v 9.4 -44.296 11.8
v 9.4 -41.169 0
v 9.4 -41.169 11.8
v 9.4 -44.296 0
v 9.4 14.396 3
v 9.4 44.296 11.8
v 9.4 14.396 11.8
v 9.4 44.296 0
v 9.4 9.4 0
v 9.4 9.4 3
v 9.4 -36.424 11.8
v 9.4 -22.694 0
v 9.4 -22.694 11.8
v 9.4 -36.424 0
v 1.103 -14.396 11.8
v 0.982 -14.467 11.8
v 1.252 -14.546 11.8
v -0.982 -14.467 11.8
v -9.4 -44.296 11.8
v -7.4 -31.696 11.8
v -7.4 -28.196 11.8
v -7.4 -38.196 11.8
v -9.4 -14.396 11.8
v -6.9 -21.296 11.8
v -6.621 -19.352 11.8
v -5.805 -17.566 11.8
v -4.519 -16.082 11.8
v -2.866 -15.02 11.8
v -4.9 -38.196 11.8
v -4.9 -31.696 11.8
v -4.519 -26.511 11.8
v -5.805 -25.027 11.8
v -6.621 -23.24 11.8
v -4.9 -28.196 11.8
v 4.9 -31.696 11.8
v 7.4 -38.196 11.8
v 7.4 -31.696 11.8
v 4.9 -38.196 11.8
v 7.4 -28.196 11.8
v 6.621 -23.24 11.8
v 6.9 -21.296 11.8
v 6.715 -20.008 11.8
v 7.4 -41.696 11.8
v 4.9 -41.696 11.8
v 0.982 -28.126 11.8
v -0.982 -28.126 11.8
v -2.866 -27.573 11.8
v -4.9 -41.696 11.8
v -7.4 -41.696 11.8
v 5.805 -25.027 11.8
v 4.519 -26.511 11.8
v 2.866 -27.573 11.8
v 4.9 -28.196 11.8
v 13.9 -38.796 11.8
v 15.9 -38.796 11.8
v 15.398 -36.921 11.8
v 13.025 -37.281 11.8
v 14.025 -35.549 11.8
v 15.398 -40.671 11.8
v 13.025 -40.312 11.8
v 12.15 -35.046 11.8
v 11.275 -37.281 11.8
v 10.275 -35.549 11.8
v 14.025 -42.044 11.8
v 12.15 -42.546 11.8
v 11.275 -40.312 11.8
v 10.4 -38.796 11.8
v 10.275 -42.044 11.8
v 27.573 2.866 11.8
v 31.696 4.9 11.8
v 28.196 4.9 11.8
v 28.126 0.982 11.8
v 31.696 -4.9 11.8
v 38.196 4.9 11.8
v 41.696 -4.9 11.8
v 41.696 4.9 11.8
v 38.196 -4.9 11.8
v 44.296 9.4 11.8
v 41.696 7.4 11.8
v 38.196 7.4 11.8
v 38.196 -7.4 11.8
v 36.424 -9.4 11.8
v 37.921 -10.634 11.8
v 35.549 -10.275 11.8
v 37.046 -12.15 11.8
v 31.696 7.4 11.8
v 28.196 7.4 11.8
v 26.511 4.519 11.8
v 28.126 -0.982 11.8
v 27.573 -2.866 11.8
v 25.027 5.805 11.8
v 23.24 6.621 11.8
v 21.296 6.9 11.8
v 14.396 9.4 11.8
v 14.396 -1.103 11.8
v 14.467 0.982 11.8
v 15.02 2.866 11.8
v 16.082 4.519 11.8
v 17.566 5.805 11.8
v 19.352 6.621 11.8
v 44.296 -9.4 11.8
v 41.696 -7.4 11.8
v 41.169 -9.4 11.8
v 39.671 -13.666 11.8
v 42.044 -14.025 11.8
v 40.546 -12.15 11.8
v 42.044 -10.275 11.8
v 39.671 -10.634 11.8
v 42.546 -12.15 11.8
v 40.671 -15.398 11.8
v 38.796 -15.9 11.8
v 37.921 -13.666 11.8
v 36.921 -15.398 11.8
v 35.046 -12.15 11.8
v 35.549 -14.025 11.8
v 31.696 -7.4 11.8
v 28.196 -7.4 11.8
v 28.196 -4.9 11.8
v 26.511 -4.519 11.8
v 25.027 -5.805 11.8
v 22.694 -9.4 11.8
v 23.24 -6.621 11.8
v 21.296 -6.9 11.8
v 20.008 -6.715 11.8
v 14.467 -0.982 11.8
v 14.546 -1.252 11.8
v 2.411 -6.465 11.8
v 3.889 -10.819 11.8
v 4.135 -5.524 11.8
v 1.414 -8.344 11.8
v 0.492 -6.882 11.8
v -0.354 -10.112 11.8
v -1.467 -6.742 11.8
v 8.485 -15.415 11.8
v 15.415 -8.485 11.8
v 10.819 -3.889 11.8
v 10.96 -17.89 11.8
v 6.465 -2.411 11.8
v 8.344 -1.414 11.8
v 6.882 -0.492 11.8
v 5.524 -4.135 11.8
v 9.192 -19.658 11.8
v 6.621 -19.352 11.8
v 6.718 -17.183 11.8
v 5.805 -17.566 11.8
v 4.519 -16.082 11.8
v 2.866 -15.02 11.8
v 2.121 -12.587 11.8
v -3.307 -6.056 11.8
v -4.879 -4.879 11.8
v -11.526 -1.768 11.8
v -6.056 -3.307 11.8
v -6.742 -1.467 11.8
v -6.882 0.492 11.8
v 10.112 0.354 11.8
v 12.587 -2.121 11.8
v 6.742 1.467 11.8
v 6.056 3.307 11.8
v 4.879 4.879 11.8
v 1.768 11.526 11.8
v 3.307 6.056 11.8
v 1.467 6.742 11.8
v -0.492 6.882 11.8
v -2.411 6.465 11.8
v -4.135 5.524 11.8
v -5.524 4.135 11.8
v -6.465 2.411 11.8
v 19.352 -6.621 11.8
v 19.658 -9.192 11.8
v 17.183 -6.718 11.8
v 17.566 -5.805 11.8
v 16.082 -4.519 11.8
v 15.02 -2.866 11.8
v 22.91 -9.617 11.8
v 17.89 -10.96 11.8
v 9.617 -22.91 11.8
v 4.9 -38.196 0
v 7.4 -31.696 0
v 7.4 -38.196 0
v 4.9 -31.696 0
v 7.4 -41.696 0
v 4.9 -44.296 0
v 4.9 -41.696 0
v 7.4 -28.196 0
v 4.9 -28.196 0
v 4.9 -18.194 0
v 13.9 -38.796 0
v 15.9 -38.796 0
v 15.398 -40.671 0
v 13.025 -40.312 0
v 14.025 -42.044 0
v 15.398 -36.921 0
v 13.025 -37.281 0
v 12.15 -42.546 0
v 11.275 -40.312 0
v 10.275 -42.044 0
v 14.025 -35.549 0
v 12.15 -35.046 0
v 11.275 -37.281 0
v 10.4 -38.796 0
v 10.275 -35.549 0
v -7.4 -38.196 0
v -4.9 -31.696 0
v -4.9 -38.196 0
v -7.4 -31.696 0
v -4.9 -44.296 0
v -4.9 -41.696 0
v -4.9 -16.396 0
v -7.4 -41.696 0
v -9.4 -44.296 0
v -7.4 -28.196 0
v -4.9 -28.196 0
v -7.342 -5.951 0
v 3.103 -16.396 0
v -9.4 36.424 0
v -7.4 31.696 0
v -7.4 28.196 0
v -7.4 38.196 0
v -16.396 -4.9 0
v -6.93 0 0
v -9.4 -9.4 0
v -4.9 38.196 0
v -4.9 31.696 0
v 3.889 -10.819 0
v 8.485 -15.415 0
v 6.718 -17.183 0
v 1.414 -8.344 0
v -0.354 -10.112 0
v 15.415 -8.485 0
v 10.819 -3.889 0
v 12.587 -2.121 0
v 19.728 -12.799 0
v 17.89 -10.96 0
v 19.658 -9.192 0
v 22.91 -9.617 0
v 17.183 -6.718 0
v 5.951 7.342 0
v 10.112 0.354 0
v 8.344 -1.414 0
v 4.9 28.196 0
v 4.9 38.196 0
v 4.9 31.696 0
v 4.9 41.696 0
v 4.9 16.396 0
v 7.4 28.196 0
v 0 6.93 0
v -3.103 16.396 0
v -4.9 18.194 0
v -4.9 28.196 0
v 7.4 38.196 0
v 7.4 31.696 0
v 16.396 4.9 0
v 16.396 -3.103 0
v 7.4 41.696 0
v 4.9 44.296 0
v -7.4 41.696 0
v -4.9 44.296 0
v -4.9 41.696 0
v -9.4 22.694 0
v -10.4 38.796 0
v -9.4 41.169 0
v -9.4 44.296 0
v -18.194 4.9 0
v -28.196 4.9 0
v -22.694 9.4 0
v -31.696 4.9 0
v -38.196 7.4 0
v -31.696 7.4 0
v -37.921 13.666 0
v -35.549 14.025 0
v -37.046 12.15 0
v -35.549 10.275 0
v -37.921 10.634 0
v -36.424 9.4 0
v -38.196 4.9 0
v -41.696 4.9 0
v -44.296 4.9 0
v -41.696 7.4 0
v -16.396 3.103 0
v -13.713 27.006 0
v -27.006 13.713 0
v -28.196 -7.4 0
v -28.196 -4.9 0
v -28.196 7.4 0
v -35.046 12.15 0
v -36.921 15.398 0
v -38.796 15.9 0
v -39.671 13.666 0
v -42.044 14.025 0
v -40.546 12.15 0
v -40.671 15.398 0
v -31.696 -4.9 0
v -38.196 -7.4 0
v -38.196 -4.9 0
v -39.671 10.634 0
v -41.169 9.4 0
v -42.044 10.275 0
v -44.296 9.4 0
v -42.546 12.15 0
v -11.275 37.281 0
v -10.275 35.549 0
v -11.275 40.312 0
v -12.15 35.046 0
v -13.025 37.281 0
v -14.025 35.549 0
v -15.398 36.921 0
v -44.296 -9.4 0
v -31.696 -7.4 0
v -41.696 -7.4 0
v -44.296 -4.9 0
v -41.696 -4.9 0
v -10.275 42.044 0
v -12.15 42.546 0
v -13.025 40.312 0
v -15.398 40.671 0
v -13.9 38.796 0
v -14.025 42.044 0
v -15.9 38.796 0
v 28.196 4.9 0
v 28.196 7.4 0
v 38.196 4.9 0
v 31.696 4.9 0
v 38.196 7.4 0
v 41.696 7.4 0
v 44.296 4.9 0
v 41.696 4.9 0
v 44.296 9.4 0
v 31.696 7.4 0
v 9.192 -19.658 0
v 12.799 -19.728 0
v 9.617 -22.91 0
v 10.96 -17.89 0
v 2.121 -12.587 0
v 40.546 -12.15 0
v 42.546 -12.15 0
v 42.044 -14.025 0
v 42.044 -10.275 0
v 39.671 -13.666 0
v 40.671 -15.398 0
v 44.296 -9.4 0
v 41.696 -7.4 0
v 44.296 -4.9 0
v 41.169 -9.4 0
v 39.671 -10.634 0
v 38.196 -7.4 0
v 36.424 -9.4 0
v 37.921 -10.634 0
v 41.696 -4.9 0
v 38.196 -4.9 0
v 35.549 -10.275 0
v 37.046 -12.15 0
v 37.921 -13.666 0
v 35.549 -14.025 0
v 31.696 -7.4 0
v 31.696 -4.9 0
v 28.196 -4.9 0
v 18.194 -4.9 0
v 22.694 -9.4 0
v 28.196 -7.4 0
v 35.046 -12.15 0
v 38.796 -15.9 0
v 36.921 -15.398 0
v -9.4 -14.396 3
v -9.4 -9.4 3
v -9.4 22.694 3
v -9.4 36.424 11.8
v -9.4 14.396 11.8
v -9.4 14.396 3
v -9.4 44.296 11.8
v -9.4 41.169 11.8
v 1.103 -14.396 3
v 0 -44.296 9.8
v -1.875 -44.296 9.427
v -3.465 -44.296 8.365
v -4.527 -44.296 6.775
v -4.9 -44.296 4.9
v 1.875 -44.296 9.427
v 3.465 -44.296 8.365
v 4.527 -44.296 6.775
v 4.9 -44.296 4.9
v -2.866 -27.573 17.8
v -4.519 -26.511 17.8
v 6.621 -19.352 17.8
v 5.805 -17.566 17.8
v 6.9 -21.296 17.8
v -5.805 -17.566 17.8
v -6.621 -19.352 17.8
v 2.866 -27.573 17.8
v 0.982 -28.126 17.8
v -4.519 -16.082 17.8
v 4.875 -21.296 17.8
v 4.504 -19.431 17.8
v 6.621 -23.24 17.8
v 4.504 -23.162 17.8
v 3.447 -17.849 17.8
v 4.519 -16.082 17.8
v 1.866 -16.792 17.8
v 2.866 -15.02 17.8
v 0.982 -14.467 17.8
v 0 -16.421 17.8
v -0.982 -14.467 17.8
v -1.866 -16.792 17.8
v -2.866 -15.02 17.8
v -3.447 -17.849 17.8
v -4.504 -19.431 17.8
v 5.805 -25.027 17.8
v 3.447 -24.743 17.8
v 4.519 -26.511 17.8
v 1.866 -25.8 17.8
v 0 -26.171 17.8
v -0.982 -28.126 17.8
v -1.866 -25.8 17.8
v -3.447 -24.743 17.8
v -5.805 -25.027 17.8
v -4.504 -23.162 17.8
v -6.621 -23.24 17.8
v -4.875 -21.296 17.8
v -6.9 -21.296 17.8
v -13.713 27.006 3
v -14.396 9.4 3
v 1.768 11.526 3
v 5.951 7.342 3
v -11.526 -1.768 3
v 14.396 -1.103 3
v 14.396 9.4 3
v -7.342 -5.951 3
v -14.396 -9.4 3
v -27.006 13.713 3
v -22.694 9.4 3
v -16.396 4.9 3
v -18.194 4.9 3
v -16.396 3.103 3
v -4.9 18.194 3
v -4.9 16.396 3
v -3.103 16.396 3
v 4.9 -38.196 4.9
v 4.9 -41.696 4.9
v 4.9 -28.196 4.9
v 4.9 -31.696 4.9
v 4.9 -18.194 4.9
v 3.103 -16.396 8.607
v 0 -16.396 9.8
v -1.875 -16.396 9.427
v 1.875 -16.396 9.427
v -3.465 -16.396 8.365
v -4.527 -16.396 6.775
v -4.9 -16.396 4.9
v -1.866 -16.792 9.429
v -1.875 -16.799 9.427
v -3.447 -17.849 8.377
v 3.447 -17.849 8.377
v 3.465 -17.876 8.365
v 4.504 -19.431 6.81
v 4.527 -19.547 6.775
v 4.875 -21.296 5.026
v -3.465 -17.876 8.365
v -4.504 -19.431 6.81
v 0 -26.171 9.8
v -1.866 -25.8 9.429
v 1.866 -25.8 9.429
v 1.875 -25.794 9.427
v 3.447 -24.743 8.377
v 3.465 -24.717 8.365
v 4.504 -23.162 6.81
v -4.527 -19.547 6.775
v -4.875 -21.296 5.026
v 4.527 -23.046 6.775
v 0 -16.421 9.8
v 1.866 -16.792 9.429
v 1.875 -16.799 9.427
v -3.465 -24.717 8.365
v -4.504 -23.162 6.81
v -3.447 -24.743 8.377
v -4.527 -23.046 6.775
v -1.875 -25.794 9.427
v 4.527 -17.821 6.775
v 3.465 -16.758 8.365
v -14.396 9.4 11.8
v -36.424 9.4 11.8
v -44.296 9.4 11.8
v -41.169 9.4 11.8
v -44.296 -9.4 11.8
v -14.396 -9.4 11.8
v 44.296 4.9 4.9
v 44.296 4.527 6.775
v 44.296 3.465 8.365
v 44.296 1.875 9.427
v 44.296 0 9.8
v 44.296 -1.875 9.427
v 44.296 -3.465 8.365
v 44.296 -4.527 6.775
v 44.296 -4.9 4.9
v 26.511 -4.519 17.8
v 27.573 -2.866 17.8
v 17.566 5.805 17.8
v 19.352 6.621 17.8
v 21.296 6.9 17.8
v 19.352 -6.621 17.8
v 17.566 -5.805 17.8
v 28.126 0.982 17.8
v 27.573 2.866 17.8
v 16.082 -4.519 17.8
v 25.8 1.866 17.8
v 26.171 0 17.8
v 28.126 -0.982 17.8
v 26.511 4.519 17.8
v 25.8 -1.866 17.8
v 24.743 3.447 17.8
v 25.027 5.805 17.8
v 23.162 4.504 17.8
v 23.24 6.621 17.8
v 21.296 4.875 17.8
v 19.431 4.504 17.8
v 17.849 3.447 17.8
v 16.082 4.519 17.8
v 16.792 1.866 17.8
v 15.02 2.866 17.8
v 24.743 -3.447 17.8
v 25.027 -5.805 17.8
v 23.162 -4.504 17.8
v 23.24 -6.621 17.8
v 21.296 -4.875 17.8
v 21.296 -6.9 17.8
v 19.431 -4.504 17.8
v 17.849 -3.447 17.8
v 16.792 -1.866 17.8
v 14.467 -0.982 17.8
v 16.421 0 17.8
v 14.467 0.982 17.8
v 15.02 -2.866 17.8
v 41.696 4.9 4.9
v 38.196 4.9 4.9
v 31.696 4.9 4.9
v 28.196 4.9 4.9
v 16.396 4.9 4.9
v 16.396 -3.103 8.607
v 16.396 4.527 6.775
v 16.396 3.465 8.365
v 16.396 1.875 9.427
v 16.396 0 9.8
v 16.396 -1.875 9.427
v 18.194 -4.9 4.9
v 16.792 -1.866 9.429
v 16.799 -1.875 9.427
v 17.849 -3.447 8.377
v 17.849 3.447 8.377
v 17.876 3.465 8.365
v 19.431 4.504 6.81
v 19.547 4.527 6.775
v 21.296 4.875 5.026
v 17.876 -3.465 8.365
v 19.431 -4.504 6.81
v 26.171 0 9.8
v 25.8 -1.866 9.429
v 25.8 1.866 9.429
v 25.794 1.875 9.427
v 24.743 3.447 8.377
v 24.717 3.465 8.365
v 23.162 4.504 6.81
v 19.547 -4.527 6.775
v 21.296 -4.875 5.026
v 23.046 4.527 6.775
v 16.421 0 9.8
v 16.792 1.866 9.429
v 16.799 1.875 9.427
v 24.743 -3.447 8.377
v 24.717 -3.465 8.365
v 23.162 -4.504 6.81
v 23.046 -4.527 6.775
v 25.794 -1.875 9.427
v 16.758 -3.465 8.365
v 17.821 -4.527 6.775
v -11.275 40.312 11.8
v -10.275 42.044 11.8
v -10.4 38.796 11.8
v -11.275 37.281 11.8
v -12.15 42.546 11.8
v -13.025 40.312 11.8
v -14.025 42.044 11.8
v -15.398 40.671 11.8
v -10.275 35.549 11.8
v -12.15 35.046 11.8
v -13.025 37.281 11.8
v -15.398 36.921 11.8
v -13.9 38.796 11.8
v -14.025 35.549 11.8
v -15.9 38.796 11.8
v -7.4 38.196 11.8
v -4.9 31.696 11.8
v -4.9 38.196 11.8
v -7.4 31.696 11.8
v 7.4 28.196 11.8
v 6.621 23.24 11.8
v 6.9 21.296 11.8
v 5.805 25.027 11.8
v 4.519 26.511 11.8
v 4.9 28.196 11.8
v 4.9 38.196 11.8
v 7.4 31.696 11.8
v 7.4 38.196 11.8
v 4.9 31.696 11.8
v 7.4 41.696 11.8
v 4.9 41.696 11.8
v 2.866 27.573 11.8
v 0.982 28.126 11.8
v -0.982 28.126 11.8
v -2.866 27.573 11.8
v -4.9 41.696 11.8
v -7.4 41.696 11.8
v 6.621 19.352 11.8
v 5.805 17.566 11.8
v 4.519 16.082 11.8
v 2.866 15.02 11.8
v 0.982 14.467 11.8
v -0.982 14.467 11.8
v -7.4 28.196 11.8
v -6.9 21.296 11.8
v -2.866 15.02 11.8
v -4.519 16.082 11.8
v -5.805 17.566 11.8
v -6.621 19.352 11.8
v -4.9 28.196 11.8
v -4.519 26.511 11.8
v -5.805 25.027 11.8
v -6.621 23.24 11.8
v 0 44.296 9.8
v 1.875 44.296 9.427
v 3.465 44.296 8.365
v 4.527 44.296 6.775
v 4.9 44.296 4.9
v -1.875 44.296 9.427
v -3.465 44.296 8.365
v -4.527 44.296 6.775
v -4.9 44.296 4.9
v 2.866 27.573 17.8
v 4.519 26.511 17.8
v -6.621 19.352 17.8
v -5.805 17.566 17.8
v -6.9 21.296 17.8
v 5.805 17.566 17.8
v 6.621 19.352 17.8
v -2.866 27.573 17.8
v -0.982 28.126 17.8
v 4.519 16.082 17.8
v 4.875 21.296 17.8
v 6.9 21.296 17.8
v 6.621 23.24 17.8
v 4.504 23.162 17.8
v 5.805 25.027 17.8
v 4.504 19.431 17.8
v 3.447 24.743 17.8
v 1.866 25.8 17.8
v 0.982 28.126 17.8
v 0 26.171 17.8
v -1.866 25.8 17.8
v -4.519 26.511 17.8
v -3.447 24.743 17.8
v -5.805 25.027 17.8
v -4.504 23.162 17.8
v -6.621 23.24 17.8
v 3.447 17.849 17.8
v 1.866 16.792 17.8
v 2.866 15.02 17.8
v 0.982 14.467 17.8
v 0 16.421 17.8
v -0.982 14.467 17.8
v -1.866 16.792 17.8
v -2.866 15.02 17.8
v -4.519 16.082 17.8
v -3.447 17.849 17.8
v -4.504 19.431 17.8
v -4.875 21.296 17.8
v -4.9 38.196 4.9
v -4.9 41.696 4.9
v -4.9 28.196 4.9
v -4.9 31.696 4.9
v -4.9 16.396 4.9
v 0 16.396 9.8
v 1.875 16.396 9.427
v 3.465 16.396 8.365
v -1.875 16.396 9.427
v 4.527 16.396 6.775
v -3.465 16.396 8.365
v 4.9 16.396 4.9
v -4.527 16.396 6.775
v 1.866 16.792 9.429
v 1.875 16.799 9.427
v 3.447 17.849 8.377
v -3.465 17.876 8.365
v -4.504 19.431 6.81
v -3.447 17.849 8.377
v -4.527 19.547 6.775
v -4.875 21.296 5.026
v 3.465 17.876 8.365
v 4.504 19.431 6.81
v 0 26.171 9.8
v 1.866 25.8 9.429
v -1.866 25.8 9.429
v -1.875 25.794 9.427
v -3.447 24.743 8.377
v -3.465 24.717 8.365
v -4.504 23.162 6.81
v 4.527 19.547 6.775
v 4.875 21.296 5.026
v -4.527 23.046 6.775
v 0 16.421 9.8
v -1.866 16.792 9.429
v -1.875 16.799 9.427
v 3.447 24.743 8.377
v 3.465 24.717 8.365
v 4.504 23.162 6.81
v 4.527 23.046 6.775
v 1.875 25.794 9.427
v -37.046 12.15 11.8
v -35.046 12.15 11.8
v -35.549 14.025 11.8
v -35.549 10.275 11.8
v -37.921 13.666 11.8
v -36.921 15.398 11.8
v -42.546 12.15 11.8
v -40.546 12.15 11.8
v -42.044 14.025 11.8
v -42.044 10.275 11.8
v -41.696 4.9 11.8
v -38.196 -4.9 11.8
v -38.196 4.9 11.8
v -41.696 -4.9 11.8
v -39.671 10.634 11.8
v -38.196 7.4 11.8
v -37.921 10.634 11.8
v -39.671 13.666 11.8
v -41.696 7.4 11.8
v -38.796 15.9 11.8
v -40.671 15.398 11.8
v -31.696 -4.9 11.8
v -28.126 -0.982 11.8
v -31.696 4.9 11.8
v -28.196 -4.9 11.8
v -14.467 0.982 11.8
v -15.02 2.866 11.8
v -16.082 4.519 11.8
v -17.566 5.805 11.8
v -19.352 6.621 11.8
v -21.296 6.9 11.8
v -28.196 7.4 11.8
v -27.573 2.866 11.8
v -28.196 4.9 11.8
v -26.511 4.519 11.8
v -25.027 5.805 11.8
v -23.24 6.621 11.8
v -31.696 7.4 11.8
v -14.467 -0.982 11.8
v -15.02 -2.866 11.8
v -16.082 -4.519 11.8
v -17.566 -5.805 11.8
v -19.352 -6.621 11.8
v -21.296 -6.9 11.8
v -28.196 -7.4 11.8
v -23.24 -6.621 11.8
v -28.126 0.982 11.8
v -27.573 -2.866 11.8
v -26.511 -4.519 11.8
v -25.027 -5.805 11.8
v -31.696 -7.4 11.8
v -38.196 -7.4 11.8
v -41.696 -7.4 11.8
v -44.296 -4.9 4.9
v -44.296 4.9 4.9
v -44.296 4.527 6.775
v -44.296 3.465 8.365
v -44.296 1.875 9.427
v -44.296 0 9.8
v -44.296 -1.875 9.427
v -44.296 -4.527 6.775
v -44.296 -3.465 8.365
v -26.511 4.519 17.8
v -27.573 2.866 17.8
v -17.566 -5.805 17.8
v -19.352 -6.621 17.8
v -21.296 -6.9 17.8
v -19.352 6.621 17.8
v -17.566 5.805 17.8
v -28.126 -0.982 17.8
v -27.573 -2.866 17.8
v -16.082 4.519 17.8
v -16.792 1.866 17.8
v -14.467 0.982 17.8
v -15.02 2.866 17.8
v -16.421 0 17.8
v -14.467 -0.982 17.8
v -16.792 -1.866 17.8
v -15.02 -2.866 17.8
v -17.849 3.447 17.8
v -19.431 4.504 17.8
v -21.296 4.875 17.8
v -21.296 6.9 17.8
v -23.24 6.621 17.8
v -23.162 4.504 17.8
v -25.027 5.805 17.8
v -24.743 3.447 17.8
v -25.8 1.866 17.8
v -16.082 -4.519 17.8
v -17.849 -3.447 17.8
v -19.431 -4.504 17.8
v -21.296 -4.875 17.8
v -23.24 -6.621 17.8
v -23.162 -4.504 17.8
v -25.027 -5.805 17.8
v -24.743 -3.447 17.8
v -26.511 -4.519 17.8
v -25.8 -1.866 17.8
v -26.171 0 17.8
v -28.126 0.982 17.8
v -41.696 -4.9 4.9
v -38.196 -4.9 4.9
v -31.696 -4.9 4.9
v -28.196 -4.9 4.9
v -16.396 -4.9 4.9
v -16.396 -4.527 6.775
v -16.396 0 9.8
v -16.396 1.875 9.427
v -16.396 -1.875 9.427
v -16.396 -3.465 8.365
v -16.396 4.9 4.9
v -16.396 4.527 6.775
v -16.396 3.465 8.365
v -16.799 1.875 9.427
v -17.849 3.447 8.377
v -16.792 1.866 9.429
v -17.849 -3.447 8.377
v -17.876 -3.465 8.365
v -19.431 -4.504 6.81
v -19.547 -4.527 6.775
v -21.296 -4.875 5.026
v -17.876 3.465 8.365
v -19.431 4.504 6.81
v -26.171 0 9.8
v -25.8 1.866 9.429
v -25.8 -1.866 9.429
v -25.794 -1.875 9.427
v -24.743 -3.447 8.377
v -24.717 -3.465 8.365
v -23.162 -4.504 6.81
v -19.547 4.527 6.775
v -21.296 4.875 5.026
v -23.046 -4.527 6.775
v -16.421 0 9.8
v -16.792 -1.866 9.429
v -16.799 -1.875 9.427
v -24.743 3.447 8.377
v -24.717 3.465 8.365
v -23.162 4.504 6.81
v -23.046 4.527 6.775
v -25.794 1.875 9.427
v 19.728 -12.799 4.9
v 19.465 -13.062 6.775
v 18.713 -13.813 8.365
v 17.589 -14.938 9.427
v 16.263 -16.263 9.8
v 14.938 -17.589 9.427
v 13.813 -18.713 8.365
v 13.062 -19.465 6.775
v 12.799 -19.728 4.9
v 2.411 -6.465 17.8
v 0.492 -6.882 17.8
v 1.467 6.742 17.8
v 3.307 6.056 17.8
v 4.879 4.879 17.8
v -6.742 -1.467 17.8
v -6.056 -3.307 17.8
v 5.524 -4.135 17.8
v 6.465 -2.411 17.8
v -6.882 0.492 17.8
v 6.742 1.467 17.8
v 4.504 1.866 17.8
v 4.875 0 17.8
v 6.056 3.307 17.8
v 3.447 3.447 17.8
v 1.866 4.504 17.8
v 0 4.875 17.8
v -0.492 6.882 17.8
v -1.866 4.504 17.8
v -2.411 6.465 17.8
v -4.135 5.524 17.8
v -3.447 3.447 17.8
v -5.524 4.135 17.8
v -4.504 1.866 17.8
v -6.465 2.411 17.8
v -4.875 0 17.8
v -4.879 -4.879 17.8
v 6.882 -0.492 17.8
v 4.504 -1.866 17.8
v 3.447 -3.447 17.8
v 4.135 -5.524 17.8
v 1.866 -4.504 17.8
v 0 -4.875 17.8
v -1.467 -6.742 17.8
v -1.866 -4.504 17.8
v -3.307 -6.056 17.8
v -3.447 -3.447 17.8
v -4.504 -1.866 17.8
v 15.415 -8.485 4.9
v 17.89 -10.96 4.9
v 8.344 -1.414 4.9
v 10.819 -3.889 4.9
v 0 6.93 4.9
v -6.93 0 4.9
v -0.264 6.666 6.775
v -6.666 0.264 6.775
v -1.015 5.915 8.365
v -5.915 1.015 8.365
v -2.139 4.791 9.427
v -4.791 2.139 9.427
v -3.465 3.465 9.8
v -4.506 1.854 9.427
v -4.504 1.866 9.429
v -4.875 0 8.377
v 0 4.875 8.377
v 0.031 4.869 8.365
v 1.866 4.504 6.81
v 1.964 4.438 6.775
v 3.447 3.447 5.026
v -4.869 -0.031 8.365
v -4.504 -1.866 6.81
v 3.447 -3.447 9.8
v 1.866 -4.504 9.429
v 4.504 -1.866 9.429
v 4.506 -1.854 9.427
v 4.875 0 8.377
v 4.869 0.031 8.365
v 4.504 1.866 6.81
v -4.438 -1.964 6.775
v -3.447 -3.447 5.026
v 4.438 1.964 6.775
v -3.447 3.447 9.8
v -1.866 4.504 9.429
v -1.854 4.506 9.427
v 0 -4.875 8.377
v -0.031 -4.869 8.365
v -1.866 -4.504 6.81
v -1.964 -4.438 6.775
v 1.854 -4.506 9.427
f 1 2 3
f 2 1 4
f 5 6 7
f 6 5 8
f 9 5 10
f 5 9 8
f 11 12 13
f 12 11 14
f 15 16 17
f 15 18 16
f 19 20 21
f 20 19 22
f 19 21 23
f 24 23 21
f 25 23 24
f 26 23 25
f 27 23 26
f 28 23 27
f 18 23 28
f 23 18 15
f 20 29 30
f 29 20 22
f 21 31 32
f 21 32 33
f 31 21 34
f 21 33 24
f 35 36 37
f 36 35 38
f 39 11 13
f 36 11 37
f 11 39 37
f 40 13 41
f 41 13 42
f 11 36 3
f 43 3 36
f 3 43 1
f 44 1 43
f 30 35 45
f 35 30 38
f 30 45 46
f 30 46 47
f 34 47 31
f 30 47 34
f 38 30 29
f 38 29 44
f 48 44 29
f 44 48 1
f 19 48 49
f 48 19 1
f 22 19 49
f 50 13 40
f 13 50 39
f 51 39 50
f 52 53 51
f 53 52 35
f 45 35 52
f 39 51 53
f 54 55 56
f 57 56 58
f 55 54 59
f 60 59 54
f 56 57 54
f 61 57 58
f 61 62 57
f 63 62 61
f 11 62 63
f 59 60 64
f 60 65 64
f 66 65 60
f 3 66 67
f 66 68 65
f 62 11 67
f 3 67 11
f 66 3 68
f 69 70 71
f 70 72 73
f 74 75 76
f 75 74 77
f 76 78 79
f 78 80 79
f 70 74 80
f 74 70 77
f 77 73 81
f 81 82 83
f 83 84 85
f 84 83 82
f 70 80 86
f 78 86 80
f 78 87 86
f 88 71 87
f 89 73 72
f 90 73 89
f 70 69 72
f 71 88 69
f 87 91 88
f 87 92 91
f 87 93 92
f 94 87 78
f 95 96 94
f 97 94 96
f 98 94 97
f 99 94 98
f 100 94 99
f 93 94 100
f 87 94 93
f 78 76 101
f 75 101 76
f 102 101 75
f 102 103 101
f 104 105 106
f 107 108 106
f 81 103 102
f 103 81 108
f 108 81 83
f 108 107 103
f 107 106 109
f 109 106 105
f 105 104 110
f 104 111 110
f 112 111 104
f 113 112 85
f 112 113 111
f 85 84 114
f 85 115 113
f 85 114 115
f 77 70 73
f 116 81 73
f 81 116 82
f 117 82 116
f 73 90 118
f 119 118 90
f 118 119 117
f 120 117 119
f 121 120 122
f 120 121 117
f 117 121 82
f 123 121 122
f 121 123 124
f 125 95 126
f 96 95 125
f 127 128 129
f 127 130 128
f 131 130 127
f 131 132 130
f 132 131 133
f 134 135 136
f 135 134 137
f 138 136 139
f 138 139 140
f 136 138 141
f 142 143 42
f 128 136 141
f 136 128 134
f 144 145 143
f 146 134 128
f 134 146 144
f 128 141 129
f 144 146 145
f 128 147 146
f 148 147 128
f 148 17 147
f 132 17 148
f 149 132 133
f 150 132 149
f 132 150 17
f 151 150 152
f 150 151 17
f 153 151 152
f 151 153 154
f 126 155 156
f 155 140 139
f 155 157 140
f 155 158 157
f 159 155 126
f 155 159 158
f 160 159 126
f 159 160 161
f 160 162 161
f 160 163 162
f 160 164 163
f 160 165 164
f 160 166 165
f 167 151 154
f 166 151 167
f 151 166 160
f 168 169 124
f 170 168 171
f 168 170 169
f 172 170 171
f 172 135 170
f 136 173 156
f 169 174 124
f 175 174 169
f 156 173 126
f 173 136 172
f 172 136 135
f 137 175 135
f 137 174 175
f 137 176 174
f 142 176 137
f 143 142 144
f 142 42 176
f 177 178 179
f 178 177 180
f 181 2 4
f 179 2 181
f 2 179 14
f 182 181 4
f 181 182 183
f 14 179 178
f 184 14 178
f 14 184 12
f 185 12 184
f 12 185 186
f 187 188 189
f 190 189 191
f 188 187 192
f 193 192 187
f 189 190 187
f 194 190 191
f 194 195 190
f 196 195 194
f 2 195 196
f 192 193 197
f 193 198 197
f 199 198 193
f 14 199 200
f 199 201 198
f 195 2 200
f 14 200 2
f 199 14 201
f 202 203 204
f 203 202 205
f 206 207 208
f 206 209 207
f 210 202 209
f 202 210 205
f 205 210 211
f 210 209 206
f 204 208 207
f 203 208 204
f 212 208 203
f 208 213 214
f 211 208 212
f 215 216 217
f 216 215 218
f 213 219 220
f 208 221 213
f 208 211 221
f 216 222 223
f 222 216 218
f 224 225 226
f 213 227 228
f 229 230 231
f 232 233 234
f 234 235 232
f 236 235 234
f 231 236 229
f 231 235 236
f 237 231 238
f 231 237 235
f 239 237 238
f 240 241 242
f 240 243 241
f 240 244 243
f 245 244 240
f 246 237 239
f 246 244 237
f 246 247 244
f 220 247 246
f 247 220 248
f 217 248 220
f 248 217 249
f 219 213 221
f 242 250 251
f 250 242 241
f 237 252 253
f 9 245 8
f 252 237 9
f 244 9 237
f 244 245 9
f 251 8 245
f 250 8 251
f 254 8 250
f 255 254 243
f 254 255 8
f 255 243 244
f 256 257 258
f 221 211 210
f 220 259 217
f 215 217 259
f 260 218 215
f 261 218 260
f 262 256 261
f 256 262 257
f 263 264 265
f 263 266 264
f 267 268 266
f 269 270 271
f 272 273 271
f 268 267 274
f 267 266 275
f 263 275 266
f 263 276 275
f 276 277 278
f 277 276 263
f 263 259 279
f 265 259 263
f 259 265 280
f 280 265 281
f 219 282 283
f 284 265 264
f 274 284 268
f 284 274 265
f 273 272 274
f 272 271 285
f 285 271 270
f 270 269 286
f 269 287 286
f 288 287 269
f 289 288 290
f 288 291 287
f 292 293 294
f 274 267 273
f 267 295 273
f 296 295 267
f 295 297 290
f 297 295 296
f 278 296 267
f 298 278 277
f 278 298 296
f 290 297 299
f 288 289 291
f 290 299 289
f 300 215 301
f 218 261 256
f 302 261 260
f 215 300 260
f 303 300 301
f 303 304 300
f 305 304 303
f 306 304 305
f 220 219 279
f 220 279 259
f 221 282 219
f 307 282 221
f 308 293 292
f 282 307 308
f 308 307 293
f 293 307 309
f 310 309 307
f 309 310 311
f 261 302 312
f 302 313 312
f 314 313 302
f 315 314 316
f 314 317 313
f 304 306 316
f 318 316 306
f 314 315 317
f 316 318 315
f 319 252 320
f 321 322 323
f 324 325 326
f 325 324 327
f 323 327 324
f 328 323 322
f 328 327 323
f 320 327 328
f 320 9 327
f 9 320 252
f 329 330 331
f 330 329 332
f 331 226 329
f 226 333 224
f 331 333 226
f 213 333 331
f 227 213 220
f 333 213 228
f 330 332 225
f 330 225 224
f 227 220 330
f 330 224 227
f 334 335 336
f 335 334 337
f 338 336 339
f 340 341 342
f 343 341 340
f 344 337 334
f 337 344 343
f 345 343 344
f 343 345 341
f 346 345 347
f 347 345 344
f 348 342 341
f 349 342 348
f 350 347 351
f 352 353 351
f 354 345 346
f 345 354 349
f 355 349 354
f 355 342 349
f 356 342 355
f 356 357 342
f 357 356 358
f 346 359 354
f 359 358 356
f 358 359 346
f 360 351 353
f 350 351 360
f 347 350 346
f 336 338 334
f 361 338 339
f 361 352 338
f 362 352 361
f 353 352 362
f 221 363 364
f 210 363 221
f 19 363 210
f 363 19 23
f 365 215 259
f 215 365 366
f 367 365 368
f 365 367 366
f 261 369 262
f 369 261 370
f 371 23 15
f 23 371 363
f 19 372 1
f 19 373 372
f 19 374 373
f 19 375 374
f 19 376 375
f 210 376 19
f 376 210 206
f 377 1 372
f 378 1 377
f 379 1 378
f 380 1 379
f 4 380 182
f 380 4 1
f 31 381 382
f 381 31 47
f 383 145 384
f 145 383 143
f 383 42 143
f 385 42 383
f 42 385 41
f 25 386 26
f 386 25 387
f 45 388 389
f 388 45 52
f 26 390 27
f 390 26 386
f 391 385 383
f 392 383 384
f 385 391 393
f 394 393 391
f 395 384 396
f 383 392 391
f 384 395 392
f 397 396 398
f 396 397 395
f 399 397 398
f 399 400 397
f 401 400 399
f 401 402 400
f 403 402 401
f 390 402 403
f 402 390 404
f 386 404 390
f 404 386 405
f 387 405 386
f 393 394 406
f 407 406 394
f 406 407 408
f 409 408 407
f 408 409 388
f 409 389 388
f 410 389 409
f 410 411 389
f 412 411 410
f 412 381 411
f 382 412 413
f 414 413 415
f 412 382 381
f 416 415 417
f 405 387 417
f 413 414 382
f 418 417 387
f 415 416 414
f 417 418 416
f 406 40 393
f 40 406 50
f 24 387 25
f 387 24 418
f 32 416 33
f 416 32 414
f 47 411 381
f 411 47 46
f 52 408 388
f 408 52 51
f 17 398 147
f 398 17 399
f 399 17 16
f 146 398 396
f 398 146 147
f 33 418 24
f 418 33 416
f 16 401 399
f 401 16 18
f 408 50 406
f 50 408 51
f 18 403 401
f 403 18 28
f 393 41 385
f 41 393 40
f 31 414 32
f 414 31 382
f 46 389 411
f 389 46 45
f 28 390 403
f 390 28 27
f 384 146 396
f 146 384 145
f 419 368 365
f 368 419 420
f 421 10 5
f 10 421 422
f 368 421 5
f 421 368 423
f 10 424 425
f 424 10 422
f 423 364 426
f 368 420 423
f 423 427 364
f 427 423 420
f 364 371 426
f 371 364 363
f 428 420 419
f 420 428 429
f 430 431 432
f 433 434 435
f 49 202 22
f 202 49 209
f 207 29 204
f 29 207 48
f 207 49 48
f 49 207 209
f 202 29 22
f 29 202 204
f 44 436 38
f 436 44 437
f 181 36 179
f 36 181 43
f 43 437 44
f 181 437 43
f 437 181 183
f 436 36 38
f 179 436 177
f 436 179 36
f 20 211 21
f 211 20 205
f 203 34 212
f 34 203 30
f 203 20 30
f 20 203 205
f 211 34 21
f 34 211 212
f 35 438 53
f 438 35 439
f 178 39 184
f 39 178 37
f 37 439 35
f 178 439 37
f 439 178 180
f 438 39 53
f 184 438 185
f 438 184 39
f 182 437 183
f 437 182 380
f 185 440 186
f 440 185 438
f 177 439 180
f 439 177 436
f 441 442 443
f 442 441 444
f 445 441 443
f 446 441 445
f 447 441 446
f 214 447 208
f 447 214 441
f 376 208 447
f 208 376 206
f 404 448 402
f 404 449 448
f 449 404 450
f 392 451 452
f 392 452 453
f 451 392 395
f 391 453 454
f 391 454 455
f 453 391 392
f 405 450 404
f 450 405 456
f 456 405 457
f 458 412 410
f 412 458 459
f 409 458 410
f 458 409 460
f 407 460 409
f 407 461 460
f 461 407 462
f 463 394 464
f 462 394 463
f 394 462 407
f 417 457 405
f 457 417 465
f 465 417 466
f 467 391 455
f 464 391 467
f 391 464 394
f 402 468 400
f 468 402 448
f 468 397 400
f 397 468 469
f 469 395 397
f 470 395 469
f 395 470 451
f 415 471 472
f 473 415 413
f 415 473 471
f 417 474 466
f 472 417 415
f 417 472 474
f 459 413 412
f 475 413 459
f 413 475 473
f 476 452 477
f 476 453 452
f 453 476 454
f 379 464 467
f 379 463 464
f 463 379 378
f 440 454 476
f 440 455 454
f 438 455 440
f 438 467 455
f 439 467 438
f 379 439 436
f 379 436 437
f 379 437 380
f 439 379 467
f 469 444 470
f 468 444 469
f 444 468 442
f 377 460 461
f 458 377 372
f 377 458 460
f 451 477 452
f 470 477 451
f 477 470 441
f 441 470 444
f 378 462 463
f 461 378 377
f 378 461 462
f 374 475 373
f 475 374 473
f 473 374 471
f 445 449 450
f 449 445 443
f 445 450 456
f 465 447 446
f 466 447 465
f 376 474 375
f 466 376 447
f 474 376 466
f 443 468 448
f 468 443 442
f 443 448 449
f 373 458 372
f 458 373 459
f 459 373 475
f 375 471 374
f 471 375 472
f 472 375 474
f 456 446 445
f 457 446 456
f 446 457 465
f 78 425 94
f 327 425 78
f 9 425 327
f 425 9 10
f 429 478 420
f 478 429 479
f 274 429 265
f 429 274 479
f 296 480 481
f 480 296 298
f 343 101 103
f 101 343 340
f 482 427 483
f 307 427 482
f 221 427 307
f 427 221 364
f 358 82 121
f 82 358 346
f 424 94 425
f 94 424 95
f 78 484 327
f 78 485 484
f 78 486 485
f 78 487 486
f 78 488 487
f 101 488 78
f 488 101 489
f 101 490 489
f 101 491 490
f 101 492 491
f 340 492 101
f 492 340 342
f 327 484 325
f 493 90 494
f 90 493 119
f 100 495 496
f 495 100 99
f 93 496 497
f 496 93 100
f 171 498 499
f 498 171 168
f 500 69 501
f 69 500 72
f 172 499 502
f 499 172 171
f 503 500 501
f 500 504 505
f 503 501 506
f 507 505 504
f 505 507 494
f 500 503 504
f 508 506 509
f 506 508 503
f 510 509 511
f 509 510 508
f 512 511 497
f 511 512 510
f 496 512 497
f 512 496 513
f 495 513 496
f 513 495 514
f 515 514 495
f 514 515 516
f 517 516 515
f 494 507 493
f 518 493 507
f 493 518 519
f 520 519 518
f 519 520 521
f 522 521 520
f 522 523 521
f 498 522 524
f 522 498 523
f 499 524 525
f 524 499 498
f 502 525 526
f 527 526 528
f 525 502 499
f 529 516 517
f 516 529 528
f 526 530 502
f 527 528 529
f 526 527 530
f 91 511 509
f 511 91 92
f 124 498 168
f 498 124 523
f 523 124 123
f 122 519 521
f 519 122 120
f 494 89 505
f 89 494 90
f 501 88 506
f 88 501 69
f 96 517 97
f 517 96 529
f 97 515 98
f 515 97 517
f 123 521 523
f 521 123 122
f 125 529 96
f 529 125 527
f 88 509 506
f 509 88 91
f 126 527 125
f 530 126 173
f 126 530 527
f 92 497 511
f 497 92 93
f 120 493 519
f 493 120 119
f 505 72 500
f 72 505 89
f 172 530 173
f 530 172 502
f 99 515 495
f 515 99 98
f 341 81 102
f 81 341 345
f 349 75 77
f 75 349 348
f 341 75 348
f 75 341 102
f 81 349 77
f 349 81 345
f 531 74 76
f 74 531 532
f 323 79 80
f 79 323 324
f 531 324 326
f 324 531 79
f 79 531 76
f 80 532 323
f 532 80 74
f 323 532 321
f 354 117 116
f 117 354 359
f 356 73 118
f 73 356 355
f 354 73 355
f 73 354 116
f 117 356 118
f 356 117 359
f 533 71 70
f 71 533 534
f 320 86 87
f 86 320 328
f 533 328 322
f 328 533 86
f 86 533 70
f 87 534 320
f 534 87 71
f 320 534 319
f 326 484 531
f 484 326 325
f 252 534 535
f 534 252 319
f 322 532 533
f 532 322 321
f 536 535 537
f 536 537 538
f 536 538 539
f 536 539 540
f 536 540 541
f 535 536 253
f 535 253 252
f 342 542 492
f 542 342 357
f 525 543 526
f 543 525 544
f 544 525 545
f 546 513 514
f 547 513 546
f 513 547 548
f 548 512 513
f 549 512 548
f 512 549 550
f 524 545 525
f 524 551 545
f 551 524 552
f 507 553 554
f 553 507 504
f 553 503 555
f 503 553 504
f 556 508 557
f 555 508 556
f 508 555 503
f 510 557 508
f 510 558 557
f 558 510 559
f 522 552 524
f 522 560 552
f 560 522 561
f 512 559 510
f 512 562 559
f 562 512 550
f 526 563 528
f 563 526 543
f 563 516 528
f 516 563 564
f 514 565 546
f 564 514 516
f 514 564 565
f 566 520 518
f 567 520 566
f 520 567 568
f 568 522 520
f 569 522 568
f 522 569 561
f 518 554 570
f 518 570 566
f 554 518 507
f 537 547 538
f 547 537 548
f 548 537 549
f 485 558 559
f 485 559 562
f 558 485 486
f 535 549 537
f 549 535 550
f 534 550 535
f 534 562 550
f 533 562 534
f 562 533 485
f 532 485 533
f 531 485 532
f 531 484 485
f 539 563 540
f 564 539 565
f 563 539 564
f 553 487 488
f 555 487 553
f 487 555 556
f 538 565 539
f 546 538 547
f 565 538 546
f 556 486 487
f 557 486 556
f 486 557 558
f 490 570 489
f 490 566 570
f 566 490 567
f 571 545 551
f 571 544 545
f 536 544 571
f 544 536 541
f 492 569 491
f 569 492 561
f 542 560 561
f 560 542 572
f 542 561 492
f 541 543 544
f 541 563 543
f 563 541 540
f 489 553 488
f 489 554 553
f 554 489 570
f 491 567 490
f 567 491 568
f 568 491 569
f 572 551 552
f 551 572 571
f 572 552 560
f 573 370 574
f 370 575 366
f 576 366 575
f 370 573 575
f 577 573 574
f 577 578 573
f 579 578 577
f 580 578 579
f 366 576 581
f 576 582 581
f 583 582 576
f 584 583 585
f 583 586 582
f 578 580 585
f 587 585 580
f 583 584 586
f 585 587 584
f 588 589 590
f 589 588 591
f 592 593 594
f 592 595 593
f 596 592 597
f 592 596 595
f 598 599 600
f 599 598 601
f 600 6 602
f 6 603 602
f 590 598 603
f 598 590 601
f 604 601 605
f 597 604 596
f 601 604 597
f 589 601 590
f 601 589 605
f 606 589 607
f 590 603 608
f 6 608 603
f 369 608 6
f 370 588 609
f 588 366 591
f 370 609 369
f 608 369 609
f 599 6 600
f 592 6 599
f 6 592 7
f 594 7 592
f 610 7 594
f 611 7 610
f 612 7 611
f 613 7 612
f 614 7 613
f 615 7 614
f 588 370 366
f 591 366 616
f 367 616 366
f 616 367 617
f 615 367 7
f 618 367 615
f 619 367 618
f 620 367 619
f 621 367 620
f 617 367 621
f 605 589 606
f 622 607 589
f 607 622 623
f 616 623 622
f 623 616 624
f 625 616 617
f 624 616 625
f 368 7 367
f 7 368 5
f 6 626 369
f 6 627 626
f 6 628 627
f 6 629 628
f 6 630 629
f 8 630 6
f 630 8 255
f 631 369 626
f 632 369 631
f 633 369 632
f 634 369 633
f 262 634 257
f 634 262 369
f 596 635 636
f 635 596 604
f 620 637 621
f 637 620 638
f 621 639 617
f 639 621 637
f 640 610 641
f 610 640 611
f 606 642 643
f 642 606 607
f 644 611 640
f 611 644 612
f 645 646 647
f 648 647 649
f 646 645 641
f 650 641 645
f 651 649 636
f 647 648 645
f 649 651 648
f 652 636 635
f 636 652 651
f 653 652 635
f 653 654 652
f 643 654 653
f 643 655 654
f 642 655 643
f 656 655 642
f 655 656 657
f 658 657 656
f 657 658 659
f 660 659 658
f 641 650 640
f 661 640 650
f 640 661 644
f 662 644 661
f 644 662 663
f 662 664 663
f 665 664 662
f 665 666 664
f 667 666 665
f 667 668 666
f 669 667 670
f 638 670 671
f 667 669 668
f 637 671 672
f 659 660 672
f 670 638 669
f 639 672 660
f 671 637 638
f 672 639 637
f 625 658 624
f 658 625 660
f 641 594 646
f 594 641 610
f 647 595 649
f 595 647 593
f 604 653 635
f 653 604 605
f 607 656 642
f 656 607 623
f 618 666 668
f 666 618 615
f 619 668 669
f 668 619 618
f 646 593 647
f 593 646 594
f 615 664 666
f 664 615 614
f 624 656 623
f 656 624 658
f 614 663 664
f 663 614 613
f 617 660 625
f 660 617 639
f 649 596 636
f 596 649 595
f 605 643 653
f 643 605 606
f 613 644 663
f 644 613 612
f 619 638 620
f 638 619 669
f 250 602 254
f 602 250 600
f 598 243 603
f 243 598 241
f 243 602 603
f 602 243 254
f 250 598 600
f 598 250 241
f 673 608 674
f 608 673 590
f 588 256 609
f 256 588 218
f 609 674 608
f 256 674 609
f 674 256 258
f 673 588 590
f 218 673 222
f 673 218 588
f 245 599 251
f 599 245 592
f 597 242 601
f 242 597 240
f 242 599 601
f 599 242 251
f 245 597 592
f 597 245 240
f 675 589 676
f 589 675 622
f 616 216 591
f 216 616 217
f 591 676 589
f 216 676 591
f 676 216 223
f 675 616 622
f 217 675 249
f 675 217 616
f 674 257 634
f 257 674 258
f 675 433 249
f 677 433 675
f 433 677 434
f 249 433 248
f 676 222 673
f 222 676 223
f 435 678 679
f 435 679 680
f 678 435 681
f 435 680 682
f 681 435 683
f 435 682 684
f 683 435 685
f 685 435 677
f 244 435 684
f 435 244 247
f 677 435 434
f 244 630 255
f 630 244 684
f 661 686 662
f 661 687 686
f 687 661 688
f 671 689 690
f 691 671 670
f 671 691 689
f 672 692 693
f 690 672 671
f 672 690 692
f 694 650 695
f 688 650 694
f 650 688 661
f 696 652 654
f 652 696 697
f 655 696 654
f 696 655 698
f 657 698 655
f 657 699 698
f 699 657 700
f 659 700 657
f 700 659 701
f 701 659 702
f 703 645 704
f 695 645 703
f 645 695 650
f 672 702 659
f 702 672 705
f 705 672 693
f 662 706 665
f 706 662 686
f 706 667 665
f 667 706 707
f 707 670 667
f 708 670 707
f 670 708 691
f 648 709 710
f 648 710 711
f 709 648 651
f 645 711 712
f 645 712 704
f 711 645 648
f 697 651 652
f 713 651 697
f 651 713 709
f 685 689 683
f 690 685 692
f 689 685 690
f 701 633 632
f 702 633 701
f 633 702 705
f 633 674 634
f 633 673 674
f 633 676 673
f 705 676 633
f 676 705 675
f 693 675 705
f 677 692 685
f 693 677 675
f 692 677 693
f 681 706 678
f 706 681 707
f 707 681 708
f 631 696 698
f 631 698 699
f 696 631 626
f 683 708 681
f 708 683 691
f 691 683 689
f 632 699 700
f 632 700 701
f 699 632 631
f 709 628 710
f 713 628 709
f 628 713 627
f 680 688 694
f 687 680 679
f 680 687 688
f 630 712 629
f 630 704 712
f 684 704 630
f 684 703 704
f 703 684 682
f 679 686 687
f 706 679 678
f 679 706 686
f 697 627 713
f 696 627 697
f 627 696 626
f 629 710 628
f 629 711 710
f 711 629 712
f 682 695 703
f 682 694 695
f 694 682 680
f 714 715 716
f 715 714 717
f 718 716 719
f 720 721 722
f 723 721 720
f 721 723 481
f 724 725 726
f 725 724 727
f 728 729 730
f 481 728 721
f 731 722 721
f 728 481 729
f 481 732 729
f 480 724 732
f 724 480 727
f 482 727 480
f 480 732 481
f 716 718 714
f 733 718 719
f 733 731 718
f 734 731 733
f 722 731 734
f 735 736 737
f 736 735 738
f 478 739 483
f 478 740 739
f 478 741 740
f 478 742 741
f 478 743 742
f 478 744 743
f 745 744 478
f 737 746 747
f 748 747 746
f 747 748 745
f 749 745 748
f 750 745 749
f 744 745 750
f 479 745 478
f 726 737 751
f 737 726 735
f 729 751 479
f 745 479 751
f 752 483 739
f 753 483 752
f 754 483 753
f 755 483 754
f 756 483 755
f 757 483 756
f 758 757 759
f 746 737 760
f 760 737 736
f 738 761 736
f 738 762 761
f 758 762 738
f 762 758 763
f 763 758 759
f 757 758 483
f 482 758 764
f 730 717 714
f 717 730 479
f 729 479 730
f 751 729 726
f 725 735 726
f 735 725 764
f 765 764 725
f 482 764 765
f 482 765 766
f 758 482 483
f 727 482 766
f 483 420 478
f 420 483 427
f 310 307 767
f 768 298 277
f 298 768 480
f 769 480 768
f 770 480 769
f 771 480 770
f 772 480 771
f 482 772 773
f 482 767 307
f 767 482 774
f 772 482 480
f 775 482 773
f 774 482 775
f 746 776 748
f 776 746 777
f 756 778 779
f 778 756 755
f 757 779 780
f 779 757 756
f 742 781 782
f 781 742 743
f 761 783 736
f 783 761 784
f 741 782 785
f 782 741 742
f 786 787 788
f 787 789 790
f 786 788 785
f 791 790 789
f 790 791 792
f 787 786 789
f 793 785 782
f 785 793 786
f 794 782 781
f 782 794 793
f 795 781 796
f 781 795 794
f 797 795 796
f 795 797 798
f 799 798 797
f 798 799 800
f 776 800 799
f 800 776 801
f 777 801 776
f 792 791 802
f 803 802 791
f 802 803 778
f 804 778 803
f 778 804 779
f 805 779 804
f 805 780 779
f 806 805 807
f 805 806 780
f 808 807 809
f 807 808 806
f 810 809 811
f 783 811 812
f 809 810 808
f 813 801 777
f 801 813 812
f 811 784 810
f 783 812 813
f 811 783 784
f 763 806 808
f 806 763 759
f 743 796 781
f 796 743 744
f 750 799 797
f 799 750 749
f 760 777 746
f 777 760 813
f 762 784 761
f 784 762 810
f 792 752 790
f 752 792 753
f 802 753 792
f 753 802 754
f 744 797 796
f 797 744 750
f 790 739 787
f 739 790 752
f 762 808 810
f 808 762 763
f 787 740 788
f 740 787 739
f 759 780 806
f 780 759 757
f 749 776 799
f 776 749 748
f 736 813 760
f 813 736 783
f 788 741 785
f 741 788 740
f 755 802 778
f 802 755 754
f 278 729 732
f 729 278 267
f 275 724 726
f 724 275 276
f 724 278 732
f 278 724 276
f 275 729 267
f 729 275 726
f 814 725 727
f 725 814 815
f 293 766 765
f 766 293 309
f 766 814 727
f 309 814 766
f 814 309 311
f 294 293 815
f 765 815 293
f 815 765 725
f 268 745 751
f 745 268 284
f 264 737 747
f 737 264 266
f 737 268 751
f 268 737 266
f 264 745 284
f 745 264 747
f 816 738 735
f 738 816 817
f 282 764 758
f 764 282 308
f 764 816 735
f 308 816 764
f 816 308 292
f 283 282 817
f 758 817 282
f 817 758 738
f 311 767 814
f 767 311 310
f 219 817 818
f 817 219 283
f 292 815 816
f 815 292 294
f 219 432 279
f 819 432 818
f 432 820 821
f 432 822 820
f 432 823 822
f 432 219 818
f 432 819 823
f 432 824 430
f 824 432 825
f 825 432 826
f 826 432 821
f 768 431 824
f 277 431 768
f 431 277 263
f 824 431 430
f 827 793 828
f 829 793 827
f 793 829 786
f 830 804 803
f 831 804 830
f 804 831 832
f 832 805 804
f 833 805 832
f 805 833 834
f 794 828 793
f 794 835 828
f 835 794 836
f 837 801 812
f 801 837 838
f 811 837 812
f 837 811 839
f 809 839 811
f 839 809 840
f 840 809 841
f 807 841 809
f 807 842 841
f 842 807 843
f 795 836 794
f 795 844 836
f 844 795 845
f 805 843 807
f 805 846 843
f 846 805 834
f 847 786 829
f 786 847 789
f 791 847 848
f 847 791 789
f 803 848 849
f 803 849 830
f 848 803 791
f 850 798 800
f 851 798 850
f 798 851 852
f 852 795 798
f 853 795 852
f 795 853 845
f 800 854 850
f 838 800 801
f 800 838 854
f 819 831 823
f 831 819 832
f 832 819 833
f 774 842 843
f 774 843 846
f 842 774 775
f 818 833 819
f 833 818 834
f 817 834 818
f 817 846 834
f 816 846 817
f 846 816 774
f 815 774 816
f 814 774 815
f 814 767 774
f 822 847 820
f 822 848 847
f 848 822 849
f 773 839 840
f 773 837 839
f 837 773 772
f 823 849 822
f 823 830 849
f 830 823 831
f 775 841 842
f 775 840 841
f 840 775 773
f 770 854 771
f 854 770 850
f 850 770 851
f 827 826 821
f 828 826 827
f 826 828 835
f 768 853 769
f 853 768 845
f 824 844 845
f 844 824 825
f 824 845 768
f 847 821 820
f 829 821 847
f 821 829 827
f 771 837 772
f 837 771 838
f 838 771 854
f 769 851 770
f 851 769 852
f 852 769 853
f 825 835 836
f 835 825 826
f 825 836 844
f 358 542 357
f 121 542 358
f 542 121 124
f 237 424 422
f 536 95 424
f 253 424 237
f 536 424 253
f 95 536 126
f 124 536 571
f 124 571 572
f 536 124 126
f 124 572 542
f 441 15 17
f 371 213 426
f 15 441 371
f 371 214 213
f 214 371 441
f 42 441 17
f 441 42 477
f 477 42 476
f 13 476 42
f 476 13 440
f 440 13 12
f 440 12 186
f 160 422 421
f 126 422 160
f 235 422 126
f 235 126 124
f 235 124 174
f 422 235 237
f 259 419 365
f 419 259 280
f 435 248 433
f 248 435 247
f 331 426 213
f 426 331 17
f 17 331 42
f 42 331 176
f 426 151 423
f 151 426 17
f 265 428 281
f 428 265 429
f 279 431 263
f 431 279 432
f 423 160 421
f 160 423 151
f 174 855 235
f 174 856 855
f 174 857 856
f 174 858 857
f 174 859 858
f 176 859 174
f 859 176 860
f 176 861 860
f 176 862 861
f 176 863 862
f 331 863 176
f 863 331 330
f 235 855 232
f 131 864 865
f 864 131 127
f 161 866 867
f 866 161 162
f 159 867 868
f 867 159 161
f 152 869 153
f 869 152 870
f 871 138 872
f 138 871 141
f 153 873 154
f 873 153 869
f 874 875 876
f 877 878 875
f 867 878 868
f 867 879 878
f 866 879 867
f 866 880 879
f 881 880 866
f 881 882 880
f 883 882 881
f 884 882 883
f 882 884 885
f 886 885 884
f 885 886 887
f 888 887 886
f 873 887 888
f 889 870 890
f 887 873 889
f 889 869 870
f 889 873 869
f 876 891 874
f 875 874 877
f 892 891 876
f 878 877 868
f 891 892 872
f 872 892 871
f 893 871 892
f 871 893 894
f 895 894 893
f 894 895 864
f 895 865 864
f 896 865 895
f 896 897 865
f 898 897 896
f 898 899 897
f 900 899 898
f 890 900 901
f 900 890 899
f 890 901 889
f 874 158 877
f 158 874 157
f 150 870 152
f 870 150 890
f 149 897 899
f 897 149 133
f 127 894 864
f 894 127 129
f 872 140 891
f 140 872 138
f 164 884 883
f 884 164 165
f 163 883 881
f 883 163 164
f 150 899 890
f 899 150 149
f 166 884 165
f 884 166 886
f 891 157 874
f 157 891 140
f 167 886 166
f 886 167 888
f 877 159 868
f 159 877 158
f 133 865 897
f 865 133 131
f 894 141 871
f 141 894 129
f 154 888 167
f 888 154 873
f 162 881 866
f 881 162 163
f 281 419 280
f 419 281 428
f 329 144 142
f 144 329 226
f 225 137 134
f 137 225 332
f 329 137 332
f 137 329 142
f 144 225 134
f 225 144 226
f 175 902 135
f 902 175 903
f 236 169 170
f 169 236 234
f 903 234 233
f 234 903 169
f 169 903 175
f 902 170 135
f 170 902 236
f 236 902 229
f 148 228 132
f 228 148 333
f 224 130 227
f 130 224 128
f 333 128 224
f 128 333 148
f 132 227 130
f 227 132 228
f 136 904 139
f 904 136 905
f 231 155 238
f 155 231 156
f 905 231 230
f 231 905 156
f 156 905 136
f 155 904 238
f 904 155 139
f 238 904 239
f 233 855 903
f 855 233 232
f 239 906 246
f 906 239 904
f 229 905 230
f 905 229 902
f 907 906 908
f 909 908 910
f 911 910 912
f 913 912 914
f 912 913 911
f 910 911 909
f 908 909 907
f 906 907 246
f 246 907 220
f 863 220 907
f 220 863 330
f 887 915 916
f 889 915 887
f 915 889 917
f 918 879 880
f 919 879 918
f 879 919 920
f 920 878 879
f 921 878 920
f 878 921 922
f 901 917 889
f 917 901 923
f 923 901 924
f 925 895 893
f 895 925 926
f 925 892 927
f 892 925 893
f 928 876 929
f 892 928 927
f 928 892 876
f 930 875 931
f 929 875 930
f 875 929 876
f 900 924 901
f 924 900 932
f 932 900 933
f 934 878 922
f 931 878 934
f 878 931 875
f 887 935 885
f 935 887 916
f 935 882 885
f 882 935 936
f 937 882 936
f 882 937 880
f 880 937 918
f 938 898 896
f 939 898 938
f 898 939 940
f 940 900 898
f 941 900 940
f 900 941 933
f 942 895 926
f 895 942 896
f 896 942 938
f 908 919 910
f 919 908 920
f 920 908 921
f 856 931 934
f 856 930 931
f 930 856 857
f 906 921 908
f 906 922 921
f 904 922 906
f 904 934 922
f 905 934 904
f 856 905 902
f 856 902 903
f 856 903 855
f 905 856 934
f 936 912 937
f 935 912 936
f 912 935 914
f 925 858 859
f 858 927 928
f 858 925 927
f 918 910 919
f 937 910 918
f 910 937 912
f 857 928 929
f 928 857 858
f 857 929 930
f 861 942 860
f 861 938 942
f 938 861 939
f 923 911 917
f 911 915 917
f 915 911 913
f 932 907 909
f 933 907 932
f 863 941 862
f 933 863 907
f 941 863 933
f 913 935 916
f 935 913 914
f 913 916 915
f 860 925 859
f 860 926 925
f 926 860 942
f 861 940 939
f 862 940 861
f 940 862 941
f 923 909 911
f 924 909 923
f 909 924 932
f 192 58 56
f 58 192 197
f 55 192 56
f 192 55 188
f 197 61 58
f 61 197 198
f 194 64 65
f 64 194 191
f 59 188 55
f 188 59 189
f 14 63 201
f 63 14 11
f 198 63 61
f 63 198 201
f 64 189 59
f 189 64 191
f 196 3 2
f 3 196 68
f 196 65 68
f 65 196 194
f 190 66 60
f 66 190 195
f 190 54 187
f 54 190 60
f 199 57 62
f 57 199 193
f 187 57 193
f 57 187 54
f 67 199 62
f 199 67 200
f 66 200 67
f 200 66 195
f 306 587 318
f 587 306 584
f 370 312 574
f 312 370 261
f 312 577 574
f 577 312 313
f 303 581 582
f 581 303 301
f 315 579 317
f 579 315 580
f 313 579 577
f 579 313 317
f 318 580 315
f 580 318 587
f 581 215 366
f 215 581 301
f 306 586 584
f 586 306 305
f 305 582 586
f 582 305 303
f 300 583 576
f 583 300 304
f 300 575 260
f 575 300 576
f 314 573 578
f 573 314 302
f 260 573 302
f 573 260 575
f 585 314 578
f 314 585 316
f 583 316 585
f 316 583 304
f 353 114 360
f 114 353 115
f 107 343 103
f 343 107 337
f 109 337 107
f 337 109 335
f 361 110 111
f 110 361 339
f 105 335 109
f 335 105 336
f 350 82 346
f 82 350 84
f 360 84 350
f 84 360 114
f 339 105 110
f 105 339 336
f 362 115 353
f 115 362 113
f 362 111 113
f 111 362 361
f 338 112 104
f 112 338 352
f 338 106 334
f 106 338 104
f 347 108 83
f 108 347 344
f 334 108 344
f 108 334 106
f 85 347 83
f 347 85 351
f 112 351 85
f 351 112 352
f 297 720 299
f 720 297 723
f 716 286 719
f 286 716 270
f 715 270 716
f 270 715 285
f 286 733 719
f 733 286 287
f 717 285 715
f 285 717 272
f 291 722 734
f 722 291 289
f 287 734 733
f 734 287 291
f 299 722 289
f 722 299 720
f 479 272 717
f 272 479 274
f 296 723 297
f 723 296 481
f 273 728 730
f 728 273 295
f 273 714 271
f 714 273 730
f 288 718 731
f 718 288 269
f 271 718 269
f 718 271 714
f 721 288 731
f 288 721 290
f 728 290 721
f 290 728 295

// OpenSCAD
wave_length=115/2.7; // 2.6ghz
antenna_width=10-0.2;
antenna_stalk_width=10-0.25;
antenna_base_length=23;

base_width=wave_length+2*antenna_base_length;
height=antenna_width+8;

ziptie_width=3.5;
ziptie_depth=2.5;

dry_screw_r=5.5/2; //dry wall
screw_r=3.5/2; //m3
backing=2;
edges=2;

module antenna_cutout() {
    difference() 
    {
        union() {
            translate([-antenna_width/2-edges-ziptie_depth,-antenna_base_length,0]) cube([
                                antenna_width+ziptie_depth*2+edges*2,
                                antenna_base_length+antenna_width/2+backing,
                                antenna_width+backing]);
            
            cylinder(height,antenna_width/2+backing,antenna_width/2+backing);
             translate([-(antenna_width+ziptie_depth*2+edges*2)/2,0,0]) cube([antenna_width+ziptie_depth*2+edges*2,
            wave_length-antenna_width-2*backing,3]);
        }
        translate([0,0,antenna_width/2]) antenna();
    }
}

module antenna() {
    //antenna cutout below
    translate([antenna_width/2,antenna_width/2,-antenna_width]) rotate([0,0,180]) cube([antenna_width,antenna_base_length+antenna_width/2,antenna_width]);
    
    //the base antenna
    cylinder(height*4,antenna_stalk_width/2,antenna_stalk_width/2);
    translate([0,antenna_width/2,0]) rotate([90,0,0]) {
        cylinder(antenna_base_length+antenna_width/2,antenna_width/2,antenna_width/2);
        }
    
    //a ziptie
    rotate([0,0,180]) translate([antenna_width/2,antenna_width/2+2,-antenna_width]) {
        
        cube([ziptie_depth,ziptie_width,height*2]);
        translate([-antenna_width-ziptie_depth,0,0]) cube([ziptie_depth,ziptie_width,height*2]);
        translate([0,10,0]) {
            cube([ziptie_depth,ziptie_width,height*2]);
            translate([-antenna_width-ziptie_depth,0,0]) cube([ziptie_depth,ziptie_width,height*2]);
        }
    }
}

module screw_hold() {
    difference() {
        cylinder(antenna_width+backing,screw_r+backing,screw_r+backing);
        cylinder(antenna_width+backing,screw_r,screw_r);
    }
}


tx_theta=45;

difference() {
    union() {
        for ( i = [0,90,180,270] ) {
            rotate([0,0,i]) translate([0,-wave_length/2,0]) antenna_cutout();
        }
        /*for ( i = [45,180+45] ) {
            rotate([0,0,i]) translate([0,-wave_length/2+10-20,0]) antenna_cutout();
        }*/
    }

    rotate([0,0,tx_theta]) translate([-antenna_width/2-edges-ziptie_depth,-antenna_base_length,0]) cube([
                        antenna_width+ziptie_depth*2+edges*2,
                        antenna_base_length+antenna_width/2+backing,
                        antenna_width+backing]);
}

rotate([0,0,tx_theta]) antenna_cutout();
    
k1=antenna_width/2+ziptie_depth+(dry_screw_r+backing);
k2=wave_length/2+antenna_base_length-dry_screw_r*2;
translate([k1,-k2,0]) screw_hold();
translate([-k1,k2,0]) screw_hold();
translate([k2,-k1,0]) screw_hold();
translate([-k2,k1,0]) screw_hold();
